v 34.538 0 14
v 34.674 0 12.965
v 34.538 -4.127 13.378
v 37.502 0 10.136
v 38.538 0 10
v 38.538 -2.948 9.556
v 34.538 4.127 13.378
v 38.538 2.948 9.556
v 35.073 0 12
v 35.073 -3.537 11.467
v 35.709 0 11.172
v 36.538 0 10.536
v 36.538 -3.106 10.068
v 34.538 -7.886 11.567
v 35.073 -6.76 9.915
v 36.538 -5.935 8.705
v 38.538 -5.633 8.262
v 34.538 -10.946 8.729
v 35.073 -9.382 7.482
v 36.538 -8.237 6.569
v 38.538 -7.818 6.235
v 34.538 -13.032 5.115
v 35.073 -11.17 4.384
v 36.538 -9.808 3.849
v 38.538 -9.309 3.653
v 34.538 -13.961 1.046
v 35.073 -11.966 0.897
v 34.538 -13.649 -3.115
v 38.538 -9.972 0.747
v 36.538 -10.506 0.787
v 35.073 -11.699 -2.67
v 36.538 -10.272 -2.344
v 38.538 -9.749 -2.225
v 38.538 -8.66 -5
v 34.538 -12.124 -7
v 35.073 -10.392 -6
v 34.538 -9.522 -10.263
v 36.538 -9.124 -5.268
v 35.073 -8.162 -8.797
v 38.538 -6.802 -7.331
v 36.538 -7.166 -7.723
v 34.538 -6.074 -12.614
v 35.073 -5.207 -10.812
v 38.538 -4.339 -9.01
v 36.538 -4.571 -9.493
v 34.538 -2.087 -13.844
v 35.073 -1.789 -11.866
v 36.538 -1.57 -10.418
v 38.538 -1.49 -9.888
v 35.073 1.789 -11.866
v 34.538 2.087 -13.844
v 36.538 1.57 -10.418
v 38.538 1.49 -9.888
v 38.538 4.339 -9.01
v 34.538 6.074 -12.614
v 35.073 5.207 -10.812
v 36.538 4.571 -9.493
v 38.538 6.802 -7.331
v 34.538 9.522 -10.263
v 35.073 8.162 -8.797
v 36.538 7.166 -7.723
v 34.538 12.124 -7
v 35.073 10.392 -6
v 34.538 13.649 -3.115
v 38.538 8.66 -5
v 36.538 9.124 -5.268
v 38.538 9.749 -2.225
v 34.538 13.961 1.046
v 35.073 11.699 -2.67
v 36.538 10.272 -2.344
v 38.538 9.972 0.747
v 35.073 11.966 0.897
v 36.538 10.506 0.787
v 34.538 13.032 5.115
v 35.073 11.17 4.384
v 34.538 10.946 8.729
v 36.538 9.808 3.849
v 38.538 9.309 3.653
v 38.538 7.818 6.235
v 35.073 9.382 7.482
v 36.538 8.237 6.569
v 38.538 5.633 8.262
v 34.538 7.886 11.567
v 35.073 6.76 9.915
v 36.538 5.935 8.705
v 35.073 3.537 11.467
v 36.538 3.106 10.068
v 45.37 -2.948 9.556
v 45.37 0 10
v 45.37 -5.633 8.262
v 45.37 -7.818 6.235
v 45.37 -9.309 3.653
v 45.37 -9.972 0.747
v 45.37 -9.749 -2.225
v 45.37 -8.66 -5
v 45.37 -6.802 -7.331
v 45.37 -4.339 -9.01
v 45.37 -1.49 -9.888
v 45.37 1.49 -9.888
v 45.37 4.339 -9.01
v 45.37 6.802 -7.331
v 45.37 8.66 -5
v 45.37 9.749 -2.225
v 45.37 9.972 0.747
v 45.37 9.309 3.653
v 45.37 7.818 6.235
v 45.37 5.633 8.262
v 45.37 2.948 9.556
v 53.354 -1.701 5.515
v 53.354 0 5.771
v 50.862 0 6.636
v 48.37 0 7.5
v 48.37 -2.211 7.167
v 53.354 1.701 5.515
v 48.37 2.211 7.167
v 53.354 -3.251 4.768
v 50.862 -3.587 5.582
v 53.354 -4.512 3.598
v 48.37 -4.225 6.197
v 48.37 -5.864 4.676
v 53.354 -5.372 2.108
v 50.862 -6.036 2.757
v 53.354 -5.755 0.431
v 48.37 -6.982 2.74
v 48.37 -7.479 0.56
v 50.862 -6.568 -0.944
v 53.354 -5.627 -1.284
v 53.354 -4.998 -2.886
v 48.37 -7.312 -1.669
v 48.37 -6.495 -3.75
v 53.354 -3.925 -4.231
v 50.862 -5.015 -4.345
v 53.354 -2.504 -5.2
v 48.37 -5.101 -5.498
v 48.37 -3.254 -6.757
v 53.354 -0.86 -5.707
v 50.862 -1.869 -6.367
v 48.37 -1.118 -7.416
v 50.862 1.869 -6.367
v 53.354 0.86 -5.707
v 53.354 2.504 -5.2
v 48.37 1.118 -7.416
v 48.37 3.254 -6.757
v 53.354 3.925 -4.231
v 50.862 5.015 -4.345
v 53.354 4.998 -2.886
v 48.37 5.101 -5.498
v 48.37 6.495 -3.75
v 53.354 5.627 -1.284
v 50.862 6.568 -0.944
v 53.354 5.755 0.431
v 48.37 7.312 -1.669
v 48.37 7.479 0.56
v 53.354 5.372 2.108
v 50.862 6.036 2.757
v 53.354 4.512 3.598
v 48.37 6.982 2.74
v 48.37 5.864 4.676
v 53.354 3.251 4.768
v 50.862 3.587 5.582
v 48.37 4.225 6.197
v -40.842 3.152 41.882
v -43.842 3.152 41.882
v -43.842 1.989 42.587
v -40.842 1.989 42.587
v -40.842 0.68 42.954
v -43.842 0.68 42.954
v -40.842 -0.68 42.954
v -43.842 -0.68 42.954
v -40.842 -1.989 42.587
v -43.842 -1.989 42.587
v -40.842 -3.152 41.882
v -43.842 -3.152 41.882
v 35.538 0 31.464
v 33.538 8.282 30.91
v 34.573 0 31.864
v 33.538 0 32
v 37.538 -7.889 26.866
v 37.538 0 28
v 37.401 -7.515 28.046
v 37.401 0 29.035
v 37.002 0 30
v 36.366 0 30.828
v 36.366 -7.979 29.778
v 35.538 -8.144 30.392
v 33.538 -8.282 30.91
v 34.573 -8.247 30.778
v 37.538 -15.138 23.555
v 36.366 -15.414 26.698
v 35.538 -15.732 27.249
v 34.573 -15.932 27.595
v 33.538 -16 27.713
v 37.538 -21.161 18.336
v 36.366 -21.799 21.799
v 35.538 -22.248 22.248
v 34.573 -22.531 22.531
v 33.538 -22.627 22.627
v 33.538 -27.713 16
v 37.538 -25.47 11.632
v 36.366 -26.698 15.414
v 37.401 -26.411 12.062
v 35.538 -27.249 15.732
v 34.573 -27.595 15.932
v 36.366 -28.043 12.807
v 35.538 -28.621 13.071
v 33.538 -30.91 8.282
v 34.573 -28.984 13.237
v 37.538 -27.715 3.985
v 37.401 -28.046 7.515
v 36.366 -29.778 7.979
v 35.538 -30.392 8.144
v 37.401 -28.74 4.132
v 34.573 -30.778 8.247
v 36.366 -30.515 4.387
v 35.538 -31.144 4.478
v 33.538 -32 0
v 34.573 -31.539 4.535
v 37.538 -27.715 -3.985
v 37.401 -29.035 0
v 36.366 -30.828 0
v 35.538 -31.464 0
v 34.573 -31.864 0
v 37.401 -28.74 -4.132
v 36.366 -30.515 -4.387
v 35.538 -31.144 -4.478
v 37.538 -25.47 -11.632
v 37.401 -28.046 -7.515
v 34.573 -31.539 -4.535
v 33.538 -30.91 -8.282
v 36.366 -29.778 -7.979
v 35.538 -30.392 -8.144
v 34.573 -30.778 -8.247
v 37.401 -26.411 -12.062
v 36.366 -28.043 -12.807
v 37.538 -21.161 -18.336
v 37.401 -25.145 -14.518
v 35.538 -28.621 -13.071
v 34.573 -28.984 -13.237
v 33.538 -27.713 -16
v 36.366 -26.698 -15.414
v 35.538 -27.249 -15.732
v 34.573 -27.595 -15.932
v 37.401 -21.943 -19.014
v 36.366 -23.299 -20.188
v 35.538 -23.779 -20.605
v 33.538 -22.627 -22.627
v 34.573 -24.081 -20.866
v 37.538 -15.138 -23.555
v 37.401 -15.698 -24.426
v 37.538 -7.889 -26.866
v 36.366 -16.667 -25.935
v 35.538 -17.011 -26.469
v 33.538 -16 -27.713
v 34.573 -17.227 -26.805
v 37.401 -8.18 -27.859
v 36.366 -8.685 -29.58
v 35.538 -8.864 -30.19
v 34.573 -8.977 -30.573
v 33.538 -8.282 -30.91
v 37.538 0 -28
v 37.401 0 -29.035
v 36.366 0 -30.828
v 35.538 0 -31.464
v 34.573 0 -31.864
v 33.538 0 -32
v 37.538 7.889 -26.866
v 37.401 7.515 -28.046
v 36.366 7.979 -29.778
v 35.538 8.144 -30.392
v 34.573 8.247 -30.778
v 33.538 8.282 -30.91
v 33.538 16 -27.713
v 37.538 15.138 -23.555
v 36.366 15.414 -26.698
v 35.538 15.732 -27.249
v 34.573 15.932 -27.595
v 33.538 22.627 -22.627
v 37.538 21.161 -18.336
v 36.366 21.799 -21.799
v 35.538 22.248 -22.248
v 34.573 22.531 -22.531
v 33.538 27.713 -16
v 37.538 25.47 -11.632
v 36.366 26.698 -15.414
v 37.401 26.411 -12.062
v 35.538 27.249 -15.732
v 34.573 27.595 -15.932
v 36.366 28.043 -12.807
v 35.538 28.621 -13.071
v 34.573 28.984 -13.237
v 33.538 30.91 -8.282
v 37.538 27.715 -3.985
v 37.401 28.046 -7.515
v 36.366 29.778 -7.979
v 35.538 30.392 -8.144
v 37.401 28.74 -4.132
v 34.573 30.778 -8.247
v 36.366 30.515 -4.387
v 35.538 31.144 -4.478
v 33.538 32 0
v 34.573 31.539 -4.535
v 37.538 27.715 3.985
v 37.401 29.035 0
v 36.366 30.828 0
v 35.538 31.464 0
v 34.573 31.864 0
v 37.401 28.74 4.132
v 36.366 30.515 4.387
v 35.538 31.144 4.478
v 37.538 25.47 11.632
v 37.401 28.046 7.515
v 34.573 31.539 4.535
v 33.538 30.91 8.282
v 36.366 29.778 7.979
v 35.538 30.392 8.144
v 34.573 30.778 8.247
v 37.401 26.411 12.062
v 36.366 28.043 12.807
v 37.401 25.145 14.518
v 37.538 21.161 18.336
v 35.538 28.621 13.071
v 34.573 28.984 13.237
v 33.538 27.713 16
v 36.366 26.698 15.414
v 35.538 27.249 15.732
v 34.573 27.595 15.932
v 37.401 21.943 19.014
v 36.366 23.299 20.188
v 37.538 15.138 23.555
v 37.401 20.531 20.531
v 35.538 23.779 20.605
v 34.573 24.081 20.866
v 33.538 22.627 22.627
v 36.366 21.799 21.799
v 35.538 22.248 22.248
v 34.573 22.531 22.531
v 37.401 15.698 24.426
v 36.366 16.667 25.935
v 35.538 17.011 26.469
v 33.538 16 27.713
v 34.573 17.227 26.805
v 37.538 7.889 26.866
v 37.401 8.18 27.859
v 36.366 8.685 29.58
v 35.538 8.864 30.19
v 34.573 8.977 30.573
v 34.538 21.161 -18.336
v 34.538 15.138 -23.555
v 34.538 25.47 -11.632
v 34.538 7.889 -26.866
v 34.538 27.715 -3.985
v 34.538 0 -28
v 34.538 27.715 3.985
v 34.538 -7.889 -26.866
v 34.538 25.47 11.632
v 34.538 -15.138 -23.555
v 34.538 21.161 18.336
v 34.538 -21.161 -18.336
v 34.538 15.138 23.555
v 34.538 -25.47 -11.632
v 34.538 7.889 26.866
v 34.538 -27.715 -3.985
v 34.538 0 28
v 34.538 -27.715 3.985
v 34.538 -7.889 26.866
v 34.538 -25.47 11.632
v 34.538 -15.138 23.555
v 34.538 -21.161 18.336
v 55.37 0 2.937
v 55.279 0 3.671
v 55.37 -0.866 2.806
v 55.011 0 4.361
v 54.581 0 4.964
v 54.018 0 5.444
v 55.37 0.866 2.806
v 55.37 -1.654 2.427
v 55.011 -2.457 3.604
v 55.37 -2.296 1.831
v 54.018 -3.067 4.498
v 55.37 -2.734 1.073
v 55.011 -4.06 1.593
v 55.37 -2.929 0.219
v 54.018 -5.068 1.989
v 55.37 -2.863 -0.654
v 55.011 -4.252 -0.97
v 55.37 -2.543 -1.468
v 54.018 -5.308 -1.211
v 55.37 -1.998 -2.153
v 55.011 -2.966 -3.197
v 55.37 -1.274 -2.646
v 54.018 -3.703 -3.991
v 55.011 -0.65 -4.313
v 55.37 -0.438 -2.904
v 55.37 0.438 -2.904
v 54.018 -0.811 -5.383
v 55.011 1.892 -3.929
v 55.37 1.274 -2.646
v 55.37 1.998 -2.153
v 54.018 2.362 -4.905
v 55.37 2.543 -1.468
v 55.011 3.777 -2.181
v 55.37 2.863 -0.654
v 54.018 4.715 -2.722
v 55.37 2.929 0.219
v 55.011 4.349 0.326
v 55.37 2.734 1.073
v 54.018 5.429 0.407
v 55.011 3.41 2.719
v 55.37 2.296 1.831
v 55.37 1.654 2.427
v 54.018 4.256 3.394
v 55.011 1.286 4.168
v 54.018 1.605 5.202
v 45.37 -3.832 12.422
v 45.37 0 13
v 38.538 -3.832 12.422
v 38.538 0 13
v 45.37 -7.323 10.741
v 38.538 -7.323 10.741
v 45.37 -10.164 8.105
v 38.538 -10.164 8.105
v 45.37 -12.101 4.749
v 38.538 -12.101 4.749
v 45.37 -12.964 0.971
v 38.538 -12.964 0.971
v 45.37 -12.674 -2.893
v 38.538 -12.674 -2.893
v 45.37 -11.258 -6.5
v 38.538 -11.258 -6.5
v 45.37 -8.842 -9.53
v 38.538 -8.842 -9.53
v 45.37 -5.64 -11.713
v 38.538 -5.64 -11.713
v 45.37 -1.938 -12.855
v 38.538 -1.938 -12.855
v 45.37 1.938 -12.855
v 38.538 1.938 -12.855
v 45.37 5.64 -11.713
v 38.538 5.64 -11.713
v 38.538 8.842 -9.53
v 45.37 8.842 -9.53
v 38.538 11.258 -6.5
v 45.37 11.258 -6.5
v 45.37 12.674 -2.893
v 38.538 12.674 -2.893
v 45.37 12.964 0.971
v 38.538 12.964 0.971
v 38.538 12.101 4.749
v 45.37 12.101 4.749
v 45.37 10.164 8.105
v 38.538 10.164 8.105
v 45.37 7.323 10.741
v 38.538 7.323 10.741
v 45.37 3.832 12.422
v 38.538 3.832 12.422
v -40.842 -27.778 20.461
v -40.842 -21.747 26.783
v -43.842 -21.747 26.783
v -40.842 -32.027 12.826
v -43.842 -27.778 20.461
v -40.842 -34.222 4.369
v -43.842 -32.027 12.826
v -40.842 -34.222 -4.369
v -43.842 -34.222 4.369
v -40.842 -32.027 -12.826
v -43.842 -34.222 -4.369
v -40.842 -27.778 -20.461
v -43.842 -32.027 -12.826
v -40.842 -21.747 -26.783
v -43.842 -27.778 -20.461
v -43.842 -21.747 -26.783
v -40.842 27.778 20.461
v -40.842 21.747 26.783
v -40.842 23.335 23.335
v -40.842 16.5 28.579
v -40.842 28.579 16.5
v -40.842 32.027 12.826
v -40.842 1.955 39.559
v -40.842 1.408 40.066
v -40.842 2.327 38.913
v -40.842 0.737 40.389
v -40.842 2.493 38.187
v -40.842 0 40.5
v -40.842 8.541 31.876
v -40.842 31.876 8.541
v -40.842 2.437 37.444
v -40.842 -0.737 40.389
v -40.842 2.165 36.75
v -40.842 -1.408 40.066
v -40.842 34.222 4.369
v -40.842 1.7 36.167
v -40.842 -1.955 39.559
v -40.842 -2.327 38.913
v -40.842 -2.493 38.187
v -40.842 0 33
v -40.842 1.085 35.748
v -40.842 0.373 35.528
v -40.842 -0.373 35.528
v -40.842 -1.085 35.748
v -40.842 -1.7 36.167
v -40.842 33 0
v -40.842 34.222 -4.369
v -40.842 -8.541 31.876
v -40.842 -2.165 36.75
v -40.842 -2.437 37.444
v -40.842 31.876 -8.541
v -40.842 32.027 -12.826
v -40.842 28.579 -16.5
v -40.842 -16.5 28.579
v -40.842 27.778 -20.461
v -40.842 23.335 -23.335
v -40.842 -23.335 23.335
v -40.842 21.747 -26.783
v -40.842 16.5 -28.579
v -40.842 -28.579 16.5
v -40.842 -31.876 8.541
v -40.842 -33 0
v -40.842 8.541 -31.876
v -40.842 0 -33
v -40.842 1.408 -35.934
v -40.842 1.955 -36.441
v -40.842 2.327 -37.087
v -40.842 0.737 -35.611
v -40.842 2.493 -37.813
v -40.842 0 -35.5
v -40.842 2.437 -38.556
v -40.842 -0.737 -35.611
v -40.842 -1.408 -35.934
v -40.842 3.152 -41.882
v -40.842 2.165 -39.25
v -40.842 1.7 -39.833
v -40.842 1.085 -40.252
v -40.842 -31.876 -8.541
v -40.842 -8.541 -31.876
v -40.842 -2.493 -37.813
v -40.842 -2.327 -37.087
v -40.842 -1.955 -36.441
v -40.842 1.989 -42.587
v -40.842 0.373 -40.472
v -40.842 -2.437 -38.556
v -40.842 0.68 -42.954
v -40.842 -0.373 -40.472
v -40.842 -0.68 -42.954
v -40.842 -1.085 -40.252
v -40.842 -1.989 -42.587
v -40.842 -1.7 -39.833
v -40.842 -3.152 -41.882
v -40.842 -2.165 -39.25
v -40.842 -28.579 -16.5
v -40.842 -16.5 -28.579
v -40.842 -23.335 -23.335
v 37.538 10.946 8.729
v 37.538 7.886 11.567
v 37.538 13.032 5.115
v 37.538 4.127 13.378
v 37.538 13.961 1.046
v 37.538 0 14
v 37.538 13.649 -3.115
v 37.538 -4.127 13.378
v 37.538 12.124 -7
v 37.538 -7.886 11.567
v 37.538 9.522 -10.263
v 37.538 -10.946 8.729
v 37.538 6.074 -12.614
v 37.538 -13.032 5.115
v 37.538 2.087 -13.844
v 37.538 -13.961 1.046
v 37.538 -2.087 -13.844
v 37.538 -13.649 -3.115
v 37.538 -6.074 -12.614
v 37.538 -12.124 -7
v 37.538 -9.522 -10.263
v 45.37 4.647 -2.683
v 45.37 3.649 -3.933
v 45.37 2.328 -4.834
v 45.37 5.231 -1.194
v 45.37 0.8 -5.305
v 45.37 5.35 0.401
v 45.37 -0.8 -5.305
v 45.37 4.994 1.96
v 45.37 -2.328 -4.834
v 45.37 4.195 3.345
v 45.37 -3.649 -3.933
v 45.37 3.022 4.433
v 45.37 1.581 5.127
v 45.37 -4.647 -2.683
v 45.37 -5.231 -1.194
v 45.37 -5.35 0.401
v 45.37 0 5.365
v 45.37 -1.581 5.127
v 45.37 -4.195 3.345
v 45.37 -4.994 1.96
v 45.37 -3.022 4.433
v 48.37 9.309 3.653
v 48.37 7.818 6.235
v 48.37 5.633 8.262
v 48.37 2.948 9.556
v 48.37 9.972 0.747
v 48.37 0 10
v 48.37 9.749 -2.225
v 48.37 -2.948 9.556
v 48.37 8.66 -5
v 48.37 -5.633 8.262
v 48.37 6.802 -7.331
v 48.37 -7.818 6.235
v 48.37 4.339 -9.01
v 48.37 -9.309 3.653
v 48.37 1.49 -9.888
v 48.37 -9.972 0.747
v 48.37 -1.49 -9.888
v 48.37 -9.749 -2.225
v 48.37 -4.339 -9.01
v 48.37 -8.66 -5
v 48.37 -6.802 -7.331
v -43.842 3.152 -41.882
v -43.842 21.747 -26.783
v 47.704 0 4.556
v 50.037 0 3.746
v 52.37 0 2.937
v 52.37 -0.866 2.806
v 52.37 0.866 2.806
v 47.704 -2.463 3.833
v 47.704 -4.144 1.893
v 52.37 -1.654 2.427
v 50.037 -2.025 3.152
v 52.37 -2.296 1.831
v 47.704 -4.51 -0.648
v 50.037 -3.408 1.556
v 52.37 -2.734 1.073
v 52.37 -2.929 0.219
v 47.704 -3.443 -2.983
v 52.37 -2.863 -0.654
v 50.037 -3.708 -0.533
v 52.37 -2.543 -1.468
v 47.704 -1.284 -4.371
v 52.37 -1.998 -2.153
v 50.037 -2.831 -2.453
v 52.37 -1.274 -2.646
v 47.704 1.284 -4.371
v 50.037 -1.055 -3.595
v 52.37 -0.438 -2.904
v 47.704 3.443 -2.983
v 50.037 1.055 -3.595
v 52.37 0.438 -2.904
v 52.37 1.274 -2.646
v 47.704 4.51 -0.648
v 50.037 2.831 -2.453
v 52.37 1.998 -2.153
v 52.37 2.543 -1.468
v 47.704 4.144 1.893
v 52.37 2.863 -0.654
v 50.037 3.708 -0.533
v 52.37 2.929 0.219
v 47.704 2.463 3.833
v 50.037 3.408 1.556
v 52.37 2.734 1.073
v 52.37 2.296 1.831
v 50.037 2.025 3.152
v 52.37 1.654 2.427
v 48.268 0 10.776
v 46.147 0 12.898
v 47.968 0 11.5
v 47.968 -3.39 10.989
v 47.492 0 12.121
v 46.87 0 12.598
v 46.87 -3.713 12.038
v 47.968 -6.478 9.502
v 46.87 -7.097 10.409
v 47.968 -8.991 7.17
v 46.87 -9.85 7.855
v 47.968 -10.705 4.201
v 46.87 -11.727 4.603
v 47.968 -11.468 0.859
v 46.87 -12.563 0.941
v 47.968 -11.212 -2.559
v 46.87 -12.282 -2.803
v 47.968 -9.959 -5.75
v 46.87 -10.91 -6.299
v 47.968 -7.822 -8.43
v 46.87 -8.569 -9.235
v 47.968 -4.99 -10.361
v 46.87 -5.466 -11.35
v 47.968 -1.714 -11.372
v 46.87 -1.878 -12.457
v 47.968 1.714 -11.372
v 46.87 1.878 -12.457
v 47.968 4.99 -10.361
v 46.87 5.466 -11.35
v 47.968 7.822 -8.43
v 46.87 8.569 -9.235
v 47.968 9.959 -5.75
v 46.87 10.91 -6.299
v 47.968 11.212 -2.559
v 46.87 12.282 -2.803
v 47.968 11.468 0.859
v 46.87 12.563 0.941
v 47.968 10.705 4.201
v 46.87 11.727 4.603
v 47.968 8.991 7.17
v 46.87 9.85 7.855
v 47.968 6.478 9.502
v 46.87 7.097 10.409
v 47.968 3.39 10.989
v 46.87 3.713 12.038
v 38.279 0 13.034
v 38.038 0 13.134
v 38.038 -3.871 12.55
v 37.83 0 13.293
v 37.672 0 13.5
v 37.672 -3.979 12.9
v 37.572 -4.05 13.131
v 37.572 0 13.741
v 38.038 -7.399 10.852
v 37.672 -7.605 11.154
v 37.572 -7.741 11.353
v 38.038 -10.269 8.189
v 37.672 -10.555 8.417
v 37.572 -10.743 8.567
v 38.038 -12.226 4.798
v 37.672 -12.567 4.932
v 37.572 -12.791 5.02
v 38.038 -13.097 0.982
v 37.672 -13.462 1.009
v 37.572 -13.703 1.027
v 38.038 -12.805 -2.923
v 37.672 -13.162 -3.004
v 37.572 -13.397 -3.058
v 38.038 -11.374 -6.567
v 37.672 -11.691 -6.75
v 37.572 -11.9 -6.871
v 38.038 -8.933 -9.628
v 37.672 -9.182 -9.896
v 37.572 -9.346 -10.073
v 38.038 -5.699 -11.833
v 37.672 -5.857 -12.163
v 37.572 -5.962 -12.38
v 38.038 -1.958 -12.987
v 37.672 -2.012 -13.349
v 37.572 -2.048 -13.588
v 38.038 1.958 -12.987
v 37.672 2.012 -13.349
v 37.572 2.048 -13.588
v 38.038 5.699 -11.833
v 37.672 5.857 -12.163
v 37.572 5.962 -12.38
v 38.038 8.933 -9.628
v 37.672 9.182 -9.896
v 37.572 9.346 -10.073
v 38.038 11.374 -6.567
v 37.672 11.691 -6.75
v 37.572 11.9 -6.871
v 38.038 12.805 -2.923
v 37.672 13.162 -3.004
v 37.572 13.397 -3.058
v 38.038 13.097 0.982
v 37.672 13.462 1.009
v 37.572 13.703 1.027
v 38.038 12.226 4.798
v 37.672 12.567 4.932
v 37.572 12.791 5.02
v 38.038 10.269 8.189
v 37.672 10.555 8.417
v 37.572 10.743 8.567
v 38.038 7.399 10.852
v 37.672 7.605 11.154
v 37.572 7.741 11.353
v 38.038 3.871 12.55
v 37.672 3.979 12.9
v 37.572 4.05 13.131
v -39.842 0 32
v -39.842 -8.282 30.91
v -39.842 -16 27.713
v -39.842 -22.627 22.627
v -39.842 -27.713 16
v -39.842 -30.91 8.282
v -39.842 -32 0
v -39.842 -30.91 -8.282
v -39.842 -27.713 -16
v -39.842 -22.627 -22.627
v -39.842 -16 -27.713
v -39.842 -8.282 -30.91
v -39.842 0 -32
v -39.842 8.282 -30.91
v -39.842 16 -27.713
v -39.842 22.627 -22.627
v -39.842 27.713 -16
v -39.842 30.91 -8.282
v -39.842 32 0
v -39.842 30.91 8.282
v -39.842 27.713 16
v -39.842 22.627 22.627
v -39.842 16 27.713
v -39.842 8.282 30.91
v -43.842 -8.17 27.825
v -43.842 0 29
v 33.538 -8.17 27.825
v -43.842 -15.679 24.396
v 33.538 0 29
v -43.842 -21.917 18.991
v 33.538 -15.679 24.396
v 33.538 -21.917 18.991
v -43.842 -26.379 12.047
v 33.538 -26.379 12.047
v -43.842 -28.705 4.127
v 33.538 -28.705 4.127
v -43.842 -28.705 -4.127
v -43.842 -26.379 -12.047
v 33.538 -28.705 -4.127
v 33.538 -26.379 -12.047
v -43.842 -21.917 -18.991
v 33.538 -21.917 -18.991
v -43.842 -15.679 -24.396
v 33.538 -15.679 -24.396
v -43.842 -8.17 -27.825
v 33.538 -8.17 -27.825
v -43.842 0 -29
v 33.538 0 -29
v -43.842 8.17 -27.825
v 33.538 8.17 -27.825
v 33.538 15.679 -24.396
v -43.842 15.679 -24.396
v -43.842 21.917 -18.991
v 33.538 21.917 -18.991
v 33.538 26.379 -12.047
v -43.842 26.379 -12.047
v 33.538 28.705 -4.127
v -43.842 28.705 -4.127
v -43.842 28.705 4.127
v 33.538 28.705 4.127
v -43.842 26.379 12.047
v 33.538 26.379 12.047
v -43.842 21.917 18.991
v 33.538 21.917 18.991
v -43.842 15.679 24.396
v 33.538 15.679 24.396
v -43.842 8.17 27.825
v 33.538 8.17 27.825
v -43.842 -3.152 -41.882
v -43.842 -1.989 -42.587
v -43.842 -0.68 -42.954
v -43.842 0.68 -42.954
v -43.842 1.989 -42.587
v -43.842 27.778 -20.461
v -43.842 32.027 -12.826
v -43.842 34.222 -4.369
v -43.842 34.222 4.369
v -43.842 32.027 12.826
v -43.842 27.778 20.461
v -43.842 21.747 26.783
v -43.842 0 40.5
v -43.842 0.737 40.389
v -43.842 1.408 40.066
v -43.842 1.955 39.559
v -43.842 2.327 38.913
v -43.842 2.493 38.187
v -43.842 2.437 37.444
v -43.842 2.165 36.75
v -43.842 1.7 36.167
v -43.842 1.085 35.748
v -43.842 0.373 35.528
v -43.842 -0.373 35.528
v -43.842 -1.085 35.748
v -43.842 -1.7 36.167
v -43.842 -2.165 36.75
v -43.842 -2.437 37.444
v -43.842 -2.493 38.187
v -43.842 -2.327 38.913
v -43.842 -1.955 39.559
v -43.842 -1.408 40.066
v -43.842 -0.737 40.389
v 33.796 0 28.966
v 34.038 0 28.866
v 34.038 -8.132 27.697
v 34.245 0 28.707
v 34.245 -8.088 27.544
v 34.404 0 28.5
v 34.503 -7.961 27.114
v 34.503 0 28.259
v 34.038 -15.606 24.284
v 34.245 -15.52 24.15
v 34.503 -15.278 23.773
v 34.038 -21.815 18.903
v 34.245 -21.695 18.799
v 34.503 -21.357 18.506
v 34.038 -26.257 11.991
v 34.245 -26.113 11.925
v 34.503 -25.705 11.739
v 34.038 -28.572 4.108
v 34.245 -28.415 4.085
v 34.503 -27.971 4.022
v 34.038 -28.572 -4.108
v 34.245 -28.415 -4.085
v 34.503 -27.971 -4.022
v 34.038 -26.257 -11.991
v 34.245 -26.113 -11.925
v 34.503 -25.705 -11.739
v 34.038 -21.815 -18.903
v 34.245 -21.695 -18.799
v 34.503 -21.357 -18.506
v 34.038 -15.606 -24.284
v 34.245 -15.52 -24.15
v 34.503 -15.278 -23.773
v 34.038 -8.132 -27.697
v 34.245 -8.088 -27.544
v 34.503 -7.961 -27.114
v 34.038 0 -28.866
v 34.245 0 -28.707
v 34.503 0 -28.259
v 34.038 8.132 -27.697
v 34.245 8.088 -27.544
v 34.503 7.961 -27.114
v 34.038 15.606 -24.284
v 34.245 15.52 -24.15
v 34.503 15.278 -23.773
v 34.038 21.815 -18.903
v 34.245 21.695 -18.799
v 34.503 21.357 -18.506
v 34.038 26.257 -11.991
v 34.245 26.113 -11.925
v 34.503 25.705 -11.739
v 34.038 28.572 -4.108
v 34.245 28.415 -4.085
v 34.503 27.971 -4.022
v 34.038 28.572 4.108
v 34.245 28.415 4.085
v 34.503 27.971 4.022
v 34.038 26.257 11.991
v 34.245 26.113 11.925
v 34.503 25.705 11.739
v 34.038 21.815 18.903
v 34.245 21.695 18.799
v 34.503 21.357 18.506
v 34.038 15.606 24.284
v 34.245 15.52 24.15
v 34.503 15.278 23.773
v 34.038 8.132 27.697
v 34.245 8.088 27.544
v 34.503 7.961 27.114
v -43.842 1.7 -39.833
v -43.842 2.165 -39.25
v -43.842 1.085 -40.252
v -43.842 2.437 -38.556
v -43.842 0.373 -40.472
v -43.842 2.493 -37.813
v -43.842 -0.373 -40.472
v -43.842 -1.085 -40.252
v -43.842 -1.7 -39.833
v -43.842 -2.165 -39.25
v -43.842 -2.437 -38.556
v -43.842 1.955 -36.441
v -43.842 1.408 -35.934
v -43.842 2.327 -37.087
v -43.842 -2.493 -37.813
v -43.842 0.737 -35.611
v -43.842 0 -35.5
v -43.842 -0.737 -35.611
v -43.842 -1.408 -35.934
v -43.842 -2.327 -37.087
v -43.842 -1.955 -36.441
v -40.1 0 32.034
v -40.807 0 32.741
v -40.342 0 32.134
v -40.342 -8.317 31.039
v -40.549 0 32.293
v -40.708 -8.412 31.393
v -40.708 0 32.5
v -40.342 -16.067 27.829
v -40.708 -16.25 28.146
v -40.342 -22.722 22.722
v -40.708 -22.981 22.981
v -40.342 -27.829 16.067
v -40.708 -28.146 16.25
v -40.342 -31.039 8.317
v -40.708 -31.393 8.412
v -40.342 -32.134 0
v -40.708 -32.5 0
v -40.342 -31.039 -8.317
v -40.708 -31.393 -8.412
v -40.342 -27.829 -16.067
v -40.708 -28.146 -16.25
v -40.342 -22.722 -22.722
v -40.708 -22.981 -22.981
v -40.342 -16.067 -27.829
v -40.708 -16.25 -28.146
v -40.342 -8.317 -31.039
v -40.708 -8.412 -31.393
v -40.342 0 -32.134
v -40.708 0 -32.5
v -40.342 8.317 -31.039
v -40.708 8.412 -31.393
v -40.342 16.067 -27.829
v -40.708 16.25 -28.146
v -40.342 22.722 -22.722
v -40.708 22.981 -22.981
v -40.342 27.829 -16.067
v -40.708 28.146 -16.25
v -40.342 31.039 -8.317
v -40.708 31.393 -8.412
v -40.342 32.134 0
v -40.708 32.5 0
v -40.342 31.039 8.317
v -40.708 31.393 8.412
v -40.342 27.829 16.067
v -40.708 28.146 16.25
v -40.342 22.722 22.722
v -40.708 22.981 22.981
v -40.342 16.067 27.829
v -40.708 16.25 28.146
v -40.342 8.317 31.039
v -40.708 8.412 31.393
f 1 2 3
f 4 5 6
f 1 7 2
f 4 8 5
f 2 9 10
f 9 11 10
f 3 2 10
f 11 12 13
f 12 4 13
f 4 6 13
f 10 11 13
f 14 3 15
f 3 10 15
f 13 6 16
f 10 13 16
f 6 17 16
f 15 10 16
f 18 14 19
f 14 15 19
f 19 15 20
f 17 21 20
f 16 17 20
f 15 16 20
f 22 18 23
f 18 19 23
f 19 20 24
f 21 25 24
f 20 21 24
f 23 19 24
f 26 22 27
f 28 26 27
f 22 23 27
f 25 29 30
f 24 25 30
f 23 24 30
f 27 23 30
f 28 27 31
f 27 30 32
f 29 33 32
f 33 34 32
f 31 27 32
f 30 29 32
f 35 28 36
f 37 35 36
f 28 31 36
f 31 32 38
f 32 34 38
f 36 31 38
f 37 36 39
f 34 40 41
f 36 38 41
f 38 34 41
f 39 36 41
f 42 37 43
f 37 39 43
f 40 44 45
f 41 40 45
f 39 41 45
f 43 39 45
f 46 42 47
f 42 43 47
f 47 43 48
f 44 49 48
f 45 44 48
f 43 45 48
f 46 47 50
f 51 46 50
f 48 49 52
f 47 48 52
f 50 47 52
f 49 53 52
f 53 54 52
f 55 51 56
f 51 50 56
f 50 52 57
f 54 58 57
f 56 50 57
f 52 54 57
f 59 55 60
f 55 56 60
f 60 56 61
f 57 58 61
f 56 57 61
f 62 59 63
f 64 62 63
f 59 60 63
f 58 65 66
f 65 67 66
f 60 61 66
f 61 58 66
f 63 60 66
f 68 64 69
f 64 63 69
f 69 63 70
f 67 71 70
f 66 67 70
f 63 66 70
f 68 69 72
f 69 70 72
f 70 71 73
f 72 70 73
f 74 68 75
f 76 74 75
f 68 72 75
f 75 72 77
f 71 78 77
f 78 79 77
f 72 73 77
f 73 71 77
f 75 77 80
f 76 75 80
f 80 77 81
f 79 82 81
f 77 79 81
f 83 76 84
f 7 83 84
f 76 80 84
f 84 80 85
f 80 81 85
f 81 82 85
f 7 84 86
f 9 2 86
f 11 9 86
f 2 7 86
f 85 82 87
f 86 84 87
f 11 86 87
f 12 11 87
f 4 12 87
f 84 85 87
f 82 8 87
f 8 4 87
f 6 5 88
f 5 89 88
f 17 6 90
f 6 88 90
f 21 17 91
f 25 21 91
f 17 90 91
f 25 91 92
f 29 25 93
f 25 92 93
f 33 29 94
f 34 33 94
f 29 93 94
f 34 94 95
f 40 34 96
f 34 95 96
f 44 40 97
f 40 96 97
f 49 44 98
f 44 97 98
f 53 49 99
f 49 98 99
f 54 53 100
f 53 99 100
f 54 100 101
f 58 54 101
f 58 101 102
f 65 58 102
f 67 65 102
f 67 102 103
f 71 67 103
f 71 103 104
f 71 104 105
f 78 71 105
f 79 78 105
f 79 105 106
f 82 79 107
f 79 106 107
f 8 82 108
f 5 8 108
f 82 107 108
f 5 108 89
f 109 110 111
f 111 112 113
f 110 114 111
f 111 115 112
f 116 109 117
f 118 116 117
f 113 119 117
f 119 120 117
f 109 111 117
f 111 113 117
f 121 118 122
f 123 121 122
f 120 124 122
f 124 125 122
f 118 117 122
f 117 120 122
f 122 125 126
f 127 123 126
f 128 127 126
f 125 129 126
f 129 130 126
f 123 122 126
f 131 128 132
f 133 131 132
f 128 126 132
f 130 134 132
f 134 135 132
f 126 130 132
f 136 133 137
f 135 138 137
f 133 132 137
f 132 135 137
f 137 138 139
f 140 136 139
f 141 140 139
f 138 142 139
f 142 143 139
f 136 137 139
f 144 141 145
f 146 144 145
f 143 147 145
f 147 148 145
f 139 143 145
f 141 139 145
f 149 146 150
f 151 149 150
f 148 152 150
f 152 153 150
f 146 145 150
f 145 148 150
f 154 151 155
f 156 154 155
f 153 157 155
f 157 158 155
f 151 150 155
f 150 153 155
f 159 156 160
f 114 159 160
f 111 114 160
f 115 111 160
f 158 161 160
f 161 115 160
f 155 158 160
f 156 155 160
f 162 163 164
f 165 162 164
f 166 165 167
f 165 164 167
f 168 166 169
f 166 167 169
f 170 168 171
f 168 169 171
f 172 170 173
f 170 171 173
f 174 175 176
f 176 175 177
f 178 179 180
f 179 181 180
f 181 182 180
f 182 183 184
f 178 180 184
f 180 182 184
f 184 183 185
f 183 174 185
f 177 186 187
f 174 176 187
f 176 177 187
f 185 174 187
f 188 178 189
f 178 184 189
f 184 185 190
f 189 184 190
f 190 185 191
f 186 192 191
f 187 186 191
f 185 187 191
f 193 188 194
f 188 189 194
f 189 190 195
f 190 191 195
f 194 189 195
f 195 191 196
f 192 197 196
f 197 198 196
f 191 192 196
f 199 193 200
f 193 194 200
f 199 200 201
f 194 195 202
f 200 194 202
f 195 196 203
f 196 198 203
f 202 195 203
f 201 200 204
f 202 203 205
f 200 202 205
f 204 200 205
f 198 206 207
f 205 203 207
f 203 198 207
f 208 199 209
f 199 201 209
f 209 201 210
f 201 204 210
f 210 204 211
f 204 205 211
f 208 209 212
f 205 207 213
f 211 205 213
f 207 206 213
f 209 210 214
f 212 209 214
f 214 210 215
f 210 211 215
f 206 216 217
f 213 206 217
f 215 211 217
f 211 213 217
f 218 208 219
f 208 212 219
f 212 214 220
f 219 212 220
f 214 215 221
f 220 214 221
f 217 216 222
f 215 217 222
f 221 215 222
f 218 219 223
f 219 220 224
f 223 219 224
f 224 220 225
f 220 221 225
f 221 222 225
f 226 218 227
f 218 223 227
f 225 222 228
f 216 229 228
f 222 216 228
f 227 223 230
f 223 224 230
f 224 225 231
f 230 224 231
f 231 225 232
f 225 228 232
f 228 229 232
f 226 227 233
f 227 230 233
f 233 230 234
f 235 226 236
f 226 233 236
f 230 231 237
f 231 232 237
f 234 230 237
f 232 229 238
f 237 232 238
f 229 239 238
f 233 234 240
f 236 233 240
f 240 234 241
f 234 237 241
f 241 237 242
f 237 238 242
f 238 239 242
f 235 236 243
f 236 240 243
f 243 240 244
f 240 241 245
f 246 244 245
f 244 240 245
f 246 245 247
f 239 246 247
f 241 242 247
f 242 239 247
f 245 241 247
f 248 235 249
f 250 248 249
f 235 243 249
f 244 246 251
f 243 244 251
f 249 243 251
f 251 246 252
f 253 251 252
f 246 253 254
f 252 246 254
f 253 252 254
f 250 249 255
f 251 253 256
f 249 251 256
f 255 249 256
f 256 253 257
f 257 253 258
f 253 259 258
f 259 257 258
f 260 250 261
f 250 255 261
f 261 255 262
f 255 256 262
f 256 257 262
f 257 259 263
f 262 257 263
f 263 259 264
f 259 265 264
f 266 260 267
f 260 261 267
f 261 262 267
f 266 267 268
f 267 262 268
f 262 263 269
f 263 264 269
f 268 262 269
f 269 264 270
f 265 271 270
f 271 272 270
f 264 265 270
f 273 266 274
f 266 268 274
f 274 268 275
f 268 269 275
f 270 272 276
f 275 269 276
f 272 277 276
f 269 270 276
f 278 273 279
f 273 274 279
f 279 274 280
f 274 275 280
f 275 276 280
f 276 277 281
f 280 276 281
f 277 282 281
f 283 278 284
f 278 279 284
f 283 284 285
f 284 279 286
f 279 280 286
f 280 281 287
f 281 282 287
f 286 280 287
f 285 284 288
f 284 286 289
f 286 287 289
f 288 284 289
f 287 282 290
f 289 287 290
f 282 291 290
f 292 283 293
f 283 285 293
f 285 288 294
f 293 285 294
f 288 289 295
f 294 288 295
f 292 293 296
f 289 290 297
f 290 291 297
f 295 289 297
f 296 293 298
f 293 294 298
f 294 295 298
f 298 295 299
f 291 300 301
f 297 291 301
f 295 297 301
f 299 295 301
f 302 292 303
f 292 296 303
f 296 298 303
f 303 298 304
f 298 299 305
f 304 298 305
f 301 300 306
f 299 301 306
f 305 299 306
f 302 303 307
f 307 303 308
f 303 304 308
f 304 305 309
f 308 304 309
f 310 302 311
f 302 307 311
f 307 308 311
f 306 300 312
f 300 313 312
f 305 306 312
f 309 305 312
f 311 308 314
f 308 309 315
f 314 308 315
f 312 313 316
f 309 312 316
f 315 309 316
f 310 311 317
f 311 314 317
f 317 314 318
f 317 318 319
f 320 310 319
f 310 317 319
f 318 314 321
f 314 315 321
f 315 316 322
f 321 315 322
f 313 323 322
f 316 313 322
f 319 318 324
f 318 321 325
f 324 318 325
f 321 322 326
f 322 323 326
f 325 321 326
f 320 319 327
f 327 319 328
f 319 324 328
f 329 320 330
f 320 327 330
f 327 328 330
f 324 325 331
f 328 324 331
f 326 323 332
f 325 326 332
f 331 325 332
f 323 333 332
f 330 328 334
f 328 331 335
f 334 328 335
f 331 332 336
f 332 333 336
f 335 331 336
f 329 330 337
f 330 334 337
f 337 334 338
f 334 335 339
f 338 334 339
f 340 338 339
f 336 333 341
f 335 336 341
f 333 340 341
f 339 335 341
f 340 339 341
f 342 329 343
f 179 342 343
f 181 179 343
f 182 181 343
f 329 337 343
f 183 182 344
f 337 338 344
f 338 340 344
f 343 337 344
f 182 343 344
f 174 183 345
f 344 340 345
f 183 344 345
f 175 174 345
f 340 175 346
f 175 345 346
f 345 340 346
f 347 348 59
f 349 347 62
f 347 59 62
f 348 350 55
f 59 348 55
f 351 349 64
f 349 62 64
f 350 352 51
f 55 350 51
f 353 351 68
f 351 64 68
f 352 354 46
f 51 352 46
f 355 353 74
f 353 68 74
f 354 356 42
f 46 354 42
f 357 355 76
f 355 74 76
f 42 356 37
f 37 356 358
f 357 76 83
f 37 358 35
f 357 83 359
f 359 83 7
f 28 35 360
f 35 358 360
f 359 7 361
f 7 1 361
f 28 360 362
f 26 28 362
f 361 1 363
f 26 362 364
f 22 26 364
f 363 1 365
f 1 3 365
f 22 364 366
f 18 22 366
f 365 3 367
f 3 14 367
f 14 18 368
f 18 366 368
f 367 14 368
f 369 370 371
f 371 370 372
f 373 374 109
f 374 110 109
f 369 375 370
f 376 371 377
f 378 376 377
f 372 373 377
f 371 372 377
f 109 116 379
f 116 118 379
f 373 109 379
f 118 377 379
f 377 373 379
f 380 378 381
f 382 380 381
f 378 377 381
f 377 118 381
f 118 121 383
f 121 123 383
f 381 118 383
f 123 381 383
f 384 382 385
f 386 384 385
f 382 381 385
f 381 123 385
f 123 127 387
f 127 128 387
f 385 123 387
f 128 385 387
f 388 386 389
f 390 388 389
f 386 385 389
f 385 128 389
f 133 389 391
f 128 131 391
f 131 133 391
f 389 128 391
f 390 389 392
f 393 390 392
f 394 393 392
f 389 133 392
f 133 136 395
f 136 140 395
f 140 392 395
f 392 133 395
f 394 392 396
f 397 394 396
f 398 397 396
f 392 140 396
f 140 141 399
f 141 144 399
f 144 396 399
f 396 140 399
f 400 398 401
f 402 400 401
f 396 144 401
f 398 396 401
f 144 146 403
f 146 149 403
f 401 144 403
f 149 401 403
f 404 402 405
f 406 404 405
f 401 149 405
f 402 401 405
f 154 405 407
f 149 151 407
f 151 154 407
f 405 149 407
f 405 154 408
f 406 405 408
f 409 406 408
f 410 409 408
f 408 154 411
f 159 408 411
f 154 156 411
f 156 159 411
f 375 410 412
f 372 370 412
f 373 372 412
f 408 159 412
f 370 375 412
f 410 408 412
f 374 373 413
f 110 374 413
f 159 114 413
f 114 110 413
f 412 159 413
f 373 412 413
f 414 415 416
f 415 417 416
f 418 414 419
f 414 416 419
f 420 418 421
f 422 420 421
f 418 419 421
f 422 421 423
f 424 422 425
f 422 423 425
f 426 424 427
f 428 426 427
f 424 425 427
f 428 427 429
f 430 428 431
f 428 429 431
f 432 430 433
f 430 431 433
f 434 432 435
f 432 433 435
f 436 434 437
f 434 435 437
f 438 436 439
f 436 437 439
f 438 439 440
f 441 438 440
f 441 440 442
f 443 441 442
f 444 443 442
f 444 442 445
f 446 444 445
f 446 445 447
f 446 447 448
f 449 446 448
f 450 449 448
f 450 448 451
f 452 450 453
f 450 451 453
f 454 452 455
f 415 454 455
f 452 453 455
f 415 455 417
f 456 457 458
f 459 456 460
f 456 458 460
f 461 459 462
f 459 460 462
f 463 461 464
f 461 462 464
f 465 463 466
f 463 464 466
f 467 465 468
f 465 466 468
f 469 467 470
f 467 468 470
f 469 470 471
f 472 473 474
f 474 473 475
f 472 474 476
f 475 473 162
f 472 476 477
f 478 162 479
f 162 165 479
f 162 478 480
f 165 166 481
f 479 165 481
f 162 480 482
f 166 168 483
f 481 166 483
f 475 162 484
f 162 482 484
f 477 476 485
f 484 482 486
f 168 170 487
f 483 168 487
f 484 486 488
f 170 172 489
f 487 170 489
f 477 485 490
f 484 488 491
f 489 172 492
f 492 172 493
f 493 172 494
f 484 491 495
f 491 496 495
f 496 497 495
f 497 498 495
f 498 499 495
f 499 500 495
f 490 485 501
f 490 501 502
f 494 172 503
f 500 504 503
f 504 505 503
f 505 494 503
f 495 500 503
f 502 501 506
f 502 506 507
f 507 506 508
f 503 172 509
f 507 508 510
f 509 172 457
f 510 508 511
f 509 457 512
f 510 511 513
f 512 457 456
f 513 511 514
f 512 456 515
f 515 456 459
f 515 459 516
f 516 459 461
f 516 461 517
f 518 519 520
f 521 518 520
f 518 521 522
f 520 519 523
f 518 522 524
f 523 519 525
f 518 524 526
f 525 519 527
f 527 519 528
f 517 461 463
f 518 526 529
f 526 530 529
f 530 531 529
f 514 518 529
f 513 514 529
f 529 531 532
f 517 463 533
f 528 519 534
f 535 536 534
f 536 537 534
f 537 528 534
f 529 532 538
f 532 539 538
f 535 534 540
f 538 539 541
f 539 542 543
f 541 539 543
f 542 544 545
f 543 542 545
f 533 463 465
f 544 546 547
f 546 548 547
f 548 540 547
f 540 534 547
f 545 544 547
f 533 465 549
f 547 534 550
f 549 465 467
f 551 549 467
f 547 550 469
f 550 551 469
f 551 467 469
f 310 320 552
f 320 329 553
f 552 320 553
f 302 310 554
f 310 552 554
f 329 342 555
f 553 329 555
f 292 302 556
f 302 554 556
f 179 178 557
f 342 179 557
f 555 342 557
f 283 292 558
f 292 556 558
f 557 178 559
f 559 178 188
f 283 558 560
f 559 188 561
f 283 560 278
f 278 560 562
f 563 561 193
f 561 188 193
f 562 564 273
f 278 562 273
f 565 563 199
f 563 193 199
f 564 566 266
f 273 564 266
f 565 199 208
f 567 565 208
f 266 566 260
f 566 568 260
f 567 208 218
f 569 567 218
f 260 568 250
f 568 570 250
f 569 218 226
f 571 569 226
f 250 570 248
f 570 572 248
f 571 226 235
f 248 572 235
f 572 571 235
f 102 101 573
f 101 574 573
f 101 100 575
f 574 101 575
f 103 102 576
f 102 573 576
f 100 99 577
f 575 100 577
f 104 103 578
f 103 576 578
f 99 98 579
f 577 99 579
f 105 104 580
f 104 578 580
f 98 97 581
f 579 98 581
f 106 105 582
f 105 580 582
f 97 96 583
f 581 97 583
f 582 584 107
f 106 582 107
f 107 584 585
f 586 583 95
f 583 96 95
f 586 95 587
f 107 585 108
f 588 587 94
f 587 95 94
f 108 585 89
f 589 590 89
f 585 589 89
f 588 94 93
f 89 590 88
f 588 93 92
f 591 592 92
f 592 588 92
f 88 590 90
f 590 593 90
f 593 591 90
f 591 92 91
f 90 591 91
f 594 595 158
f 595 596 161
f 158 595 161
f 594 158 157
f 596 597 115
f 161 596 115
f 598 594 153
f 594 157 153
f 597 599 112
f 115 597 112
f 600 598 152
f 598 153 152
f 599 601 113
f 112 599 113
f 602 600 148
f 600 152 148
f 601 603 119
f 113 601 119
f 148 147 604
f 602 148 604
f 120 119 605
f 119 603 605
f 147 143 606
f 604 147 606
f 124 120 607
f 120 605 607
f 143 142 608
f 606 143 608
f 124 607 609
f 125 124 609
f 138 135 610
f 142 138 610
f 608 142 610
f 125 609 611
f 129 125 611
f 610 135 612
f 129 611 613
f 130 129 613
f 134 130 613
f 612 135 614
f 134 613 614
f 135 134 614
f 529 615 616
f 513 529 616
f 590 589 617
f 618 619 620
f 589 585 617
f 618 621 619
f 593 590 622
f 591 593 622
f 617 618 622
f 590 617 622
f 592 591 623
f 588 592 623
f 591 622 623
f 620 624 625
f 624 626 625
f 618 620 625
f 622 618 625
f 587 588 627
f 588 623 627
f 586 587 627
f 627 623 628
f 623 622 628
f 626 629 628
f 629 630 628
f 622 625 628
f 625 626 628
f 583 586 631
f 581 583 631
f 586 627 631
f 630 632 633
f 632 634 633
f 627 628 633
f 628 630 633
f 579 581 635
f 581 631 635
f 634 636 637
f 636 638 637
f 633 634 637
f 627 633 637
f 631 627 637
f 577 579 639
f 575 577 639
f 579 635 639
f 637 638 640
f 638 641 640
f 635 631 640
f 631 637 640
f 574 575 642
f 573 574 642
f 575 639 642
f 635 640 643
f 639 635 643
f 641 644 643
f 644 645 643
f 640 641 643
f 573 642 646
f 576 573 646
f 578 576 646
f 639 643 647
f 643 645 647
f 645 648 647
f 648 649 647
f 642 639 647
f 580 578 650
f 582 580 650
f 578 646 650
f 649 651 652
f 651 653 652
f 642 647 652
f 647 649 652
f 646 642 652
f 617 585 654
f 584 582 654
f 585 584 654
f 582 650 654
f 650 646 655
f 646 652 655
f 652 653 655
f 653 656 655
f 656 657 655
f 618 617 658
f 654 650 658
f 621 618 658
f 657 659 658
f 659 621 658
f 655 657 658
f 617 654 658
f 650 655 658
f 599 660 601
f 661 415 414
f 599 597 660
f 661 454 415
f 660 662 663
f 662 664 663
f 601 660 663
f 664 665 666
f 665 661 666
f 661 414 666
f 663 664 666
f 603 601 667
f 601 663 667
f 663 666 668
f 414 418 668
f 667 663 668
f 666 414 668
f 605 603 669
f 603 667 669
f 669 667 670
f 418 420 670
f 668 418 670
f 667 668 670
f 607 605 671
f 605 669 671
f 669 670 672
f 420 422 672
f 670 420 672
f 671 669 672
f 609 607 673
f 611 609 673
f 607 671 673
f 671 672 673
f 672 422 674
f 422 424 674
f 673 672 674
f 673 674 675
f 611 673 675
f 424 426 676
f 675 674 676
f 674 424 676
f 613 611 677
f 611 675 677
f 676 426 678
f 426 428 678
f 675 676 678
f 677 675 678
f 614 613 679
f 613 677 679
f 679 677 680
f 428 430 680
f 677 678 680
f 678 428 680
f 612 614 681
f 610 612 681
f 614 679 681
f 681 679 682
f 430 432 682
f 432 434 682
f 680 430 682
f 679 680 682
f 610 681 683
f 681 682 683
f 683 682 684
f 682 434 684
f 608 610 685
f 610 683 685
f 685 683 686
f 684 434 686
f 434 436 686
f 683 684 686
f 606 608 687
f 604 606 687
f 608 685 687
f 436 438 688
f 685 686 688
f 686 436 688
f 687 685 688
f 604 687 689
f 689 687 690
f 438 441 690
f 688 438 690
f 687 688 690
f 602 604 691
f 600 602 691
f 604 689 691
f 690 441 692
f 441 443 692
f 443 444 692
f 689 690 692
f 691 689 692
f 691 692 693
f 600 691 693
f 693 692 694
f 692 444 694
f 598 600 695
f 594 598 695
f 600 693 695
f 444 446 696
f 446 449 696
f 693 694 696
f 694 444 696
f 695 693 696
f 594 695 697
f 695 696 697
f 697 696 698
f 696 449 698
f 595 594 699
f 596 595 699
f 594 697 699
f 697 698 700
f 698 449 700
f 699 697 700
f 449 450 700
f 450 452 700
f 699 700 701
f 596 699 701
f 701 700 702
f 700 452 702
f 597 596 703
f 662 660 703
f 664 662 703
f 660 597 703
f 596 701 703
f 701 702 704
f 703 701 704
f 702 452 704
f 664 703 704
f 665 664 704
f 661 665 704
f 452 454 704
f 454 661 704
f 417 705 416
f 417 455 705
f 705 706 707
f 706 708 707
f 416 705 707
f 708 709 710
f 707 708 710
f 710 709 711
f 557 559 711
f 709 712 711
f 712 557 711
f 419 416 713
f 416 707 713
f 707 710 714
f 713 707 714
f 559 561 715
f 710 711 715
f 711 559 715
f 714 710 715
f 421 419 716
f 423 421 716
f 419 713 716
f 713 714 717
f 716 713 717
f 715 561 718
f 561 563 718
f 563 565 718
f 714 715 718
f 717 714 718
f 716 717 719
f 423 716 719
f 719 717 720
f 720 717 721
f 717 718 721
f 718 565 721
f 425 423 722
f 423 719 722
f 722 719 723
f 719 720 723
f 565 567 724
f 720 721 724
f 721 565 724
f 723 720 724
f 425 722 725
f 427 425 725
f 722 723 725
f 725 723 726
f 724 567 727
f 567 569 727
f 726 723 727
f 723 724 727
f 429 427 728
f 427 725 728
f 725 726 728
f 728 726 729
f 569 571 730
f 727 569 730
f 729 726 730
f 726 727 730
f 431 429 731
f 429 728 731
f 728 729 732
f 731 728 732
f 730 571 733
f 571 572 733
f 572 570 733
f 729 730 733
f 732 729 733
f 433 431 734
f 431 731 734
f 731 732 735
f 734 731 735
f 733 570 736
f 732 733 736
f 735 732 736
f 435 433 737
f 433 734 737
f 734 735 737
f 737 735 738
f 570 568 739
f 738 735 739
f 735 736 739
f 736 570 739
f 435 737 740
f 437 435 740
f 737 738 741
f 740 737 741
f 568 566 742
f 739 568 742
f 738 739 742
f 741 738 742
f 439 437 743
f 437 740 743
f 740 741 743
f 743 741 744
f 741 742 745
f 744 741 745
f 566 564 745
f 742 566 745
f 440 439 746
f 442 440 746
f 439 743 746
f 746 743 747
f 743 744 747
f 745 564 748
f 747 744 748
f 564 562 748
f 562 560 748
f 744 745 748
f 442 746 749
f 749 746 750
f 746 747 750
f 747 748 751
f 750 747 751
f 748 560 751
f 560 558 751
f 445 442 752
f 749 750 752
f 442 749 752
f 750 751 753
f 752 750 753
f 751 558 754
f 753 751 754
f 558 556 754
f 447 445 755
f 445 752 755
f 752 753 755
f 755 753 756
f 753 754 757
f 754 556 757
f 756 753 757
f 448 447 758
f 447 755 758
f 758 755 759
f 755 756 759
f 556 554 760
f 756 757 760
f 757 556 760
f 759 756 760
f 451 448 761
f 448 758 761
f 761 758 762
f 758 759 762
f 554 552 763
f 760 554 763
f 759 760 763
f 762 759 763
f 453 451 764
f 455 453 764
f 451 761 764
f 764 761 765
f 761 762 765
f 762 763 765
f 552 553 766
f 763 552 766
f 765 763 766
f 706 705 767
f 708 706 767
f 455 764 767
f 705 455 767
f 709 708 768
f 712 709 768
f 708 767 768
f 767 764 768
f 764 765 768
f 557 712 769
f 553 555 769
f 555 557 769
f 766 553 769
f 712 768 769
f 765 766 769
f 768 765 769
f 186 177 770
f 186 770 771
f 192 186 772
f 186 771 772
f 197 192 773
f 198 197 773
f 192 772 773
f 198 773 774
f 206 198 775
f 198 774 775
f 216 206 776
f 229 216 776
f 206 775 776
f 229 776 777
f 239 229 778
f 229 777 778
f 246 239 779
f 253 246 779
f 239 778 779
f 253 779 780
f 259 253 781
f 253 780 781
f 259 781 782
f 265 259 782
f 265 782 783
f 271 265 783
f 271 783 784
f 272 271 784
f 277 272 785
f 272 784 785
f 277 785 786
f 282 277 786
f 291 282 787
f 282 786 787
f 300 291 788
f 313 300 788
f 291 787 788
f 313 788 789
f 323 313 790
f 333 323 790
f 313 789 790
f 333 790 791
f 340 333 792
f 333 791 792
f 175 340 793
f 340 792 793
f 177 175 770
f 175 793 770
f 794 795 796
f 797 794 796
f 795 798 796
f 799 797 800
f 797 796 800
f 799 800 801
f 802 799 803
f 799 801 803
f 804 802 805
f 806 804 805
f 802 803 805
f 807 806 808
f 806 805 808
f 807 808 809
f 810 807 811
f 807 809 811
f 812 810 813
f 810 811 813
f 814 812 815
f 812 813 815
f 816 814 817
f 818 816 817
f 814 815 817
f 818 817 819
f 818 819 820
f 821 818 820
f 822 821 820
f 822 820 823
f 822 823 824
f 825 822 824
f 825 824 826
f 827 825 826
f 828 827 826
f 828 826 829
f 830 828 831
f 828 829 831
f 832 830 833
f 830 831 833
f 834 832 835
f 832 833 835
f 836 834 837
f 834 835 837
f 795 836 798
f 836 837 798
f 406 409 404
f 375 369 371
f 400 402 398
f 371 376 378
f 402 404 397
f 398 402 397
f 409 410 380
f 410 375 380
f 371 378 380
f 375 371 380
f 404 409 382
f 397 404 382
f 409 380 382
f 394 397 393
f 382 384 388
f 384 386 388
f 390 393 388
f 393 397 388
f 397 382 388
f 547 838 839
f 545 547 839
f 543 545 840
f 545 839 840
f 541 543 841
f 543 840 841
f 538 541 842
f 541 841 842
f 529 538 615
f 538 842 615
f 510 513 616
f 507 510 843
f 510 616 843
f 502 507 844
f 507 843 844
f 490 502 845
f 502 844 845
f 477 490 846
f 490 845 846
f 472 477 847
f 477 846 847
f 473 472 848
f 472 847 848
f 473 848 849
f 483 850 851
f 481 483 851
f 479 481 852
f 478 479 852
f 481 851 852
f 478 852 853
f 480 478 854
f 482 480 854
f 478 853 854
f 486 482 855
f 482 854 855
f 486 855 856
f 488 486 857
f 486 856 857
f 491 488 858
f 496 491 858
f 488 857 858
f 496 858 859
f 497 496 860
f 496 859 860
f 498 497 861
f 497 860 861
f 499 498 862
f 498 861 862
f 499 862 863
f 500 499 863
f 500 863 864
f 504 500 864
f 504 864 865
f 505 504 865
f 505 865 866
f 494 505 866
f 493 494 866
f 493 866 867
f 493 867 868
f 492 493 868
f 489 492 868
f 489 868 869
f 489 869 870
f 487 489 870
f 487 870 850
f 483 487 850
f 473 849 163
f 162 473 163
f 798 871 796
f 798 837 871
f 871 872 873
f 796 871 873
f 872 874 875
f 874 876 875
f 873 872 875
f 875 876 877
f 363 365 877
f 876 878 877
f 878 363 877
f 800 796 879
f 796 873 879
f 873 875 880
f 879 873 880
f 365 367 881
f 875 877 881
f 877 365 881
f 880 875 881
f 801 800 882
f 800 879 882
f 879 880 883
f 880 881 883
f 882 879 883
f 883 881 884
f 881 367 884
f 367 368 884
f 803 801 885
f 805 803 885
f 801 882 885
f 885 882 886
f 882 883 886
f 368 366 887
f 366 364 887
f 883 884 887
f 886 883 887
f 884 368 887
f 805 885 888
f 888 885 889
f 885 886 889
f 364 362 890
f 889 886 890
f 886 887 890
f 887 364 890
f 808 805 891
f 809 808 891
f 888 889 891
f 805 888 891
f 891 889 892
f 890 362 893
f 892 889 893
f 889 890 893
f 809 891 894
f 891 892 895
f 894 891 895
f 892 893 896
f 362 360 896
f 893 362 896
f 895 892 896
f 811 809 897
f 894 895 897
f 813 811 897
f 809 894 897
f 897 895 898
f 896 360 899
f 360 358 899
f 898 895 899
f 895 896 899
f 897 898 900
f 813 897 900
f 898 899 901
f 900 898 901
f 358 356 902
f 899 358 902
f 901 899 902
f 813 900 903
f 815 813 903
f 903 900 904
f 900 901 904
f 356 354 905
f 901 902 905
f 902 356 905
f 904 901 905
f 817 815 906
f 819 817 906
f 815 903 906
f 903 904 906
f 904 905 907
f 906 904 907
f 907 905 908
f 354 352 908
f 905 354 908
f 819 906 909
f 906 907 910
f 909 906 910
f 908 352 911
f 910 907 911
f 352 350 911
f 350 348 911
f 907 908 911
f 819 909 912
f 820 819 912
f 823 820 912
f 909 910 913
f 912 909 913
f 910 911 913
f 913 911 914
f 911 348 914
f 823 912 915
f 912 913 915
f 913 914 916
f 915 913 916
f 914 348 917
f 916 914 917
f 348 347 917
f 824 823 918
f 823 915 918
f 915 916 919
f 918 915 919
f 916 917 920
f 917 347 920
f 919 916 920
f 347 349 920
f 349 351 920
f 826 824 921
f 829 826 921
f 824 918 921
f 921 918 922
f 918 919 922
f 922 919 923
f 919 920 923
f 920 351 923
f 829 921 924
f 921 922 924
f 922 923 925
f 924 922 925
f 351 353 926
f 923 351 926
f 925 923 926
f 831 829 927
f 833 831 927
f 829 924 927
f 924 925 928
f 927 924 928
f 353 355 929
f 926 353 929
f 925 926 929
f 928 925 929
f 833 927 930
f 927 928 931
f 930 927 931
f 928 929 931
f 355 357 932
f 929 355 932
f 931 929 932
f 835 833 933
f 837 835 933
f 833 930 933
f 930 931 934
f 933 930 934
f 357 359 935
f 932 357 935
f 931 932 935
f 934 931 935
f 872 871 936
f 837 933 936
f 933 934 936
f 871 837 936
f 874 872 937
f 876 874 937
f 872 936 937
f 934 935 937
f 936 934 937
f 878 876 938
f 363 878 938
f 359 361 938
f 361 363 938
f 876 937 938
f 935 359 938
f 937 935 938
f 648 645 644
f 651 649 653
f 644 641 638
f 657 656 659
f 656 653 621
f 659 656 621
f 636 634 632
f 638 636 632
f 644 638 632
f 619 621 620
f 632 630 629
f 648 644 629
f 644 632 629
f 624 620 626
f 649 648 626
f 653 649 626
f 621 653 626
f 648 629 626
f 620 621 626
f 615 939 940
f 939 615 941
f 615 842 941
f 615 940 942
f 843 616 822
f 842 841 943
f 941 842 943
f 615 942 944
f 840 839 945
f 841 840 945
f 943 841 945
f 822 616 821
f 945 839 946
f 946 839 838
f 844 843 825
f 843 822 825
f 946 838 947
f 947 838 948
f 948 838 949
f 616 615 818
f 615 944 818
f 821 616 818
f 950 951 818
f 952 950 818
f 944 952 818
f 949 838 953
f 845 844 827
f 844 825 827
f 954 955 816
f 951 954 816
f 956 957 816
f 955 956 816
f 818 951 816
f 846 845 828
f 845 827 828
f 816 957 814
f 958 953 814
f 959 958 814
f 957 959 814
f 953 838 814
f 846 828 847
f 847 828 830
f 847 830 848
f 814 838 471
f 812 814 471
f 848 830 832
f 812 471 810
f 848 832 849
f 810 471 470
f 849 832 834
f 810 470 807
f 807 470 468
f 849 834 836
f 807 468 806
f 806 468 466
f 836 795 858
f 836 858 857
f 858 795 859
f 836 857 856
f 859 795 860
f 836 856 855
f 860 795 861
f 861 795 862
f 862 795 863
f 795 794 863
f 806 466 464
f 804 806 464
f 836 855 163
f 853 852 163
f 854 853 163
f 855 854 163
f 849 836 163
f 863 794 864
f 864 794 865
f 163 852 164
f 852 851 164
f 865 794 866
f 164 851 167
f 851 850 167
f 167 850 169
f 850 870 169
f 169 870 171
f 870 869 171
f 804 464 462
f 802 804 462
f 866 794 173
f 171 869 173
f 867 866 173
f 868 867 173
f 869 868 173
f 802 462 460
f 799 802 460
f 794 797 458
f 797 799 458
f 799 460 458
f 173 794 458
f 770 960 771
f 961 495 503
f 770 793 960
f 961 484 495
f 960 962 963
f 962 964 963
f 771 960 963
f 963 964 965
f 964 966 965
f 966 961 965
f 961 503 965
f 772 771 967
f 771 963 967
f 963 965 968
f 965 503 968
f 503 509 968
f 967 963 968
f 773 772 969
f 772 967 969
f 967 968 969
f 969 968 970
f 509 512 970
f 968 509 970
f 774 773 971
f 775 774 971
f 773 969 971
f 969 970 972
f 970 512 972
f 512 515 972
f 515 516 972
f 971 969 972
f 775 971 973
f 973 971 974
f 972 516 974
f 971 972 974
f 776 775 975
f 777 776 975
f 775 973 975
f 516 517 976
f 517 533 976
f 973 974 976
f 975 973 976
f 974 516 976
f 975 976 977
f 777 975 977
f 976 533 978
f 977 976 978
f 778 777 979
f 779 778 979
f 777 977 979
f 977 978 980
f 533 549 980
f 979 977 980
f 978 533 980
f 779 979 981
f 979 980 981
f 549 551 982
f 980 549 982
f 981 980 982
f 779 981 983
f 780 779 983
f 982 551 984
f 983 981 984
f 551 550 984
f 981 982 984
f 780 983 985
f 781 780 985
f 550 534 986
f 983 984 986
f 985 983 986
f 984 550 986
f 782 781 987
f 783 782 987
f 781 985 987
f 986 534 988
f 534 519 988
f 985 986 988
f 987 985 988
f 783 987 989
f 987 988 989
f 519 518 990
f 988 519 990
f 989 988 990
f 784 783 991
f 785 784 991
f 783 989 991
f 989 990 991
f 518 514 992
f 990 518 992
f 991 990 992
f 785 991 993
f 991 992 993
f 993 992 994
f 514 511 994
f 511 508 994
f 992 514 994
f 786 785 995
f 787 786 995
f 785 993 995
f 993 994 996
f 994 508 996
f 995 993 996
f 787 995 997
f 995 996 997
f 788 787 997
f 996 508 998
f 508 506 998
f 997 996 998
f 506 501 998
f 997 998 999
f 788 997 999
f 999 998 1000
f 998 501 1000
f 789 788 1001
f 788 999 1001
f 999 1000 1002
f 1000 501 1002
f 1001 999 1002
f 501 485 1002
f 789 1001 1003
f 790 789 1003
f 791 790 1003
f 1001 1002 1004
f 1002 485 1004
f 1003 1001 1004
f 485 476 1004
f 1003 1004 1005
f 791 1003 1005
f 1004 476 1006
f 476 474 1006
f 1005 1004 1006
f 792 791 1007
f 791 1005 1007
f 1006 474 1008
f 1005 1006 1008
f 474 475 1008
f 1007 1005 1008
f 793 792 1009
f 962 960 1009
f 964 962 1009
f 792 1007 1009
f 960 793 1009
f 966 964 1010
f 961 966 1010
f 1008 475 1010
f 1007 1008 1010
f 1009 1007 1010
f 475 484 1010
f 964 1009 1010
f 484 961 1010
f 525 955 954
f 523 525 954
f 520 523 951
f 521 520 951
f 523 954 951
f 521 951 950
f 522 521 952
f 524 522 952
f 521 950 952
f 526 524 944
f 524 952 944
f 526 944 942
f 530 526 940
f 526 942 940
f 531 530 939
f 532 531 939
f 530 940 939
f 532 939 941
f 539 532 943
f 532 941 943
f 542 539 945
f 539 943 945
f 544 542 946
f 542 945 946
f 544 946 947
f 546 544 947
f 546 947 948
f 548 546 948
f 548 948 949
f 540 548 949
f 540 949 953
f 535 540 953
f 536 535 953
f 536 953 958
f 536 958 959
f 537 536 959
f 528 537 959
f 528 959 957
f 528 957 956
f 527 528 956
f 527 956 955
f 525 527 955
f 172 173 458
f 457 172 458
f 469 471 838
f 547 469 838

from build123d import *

# Parameters (mm, degrees)
ESQUISSE2_R             = 49.06578461
ENL_V_MAT_EXTRU_1_DEPTH = 118.868532804
ESQUISSE3_R             = 2.5
ENL_V_MAT_EXTRU_2_DEPTH = 114.499960464


with BuildPart() as part:
    # Esquisse1 → Révolution1 (revolve)
    with BuildSketch(Plane.XY, mode=Mode.PRIVATE) as r_volution1_sk:
        with BuildLine():
            Line((-43.841564166, 45), (-43.841564166, 29))
            Line((-43.841564166, 29), (33.537566626, 29))
            ThreePointArc((33.537566626, 29), (34.244673407, 28.707106781), (34.537566626, 28))
            Line((34.537566626, 28), (34.537566626, 14))
            ThreePointArc((34.537566626, 14), (35.709139501, 11.171572875), (38.537566626, 10))
            Line((38.537566626, 10), (45.370284953, 10))
            Line((45.370284953, 10), (45.370284953, 5.365359199))
            Line((45.370284953, 5.365359199), (52.370284953, 2.936913115))
            Line((52.370284953, 2.936913115), (52.370284953, 0))
            Line((52.370284953, 0), (55.370284953, 0))
            Line((55.370284953, 0), (55.370284953, 2.936913115))
            ThreePointArc((55.370284953, 2.936913115), (54.814647694, 4.676191928), (53.35355776, 5.771198666))
            Line((53.35355776, 5.771198666), (48.370284953, 7.5))
            Line((48.370284953, 7.5), (48.370284953, 10))
            ThreePointArc((48.370284953, 10), (47.491605296, 12.121320344), (45.370284953, 13))
            Line((45.370284953, 13), (38.537566626, 13))
            ThreePointArc((38.537566626, 13), (37.830459844, 13.292893219), (37.537566626, 14))
            Line((37.537566626, 14), (37.537566626, 28))
            ThreePointArc((37.537566626, 28), (36.36599375, 30.828427125), (33.537566626, 32))
            Line((33.537566626, 32), (-39.841564166, 32))
            ThreePointArc((-39.841564166, 32), (-40.548670947, 32.292893219), (-40.841564166, 33))
            Line((-40.841564166, 33), (-40.841564166, 45))
            Line((-40.841564166, 45), (-43.841564166, 45))
        make_face()
    revolve(r_volution1_sk.sketch.rotate(Axis((-73.163253383, 0, 0), (1, 0, 0)), 90), axis=Axis((-73.163253383, 0, 0), (1, 0, 0)))

    # Esquisse2 → Enlèv. mat.-Extru.1 (cut, through all)
    with BuildSketch(Plane.ZY.offset(43.841564166)):
        Circle(ESQUISSE2_R)
        with BuildLine():
            Line((-41.881578947, 3.151720939), (-26.782894737, 21.746874477))
            ThreePointArc((-26.782894737, 21.746874477), (0, 34.5), (26.782894737, 21.746874477))
            Line((26.782894737, 21.746874477), (41.881578947, 3.151720939))
            ThreePointArc((41.881578947, 3.151720939), (43, 0), (41.881578947, -3.151720939))
            Line((41.881578947, -3.151720939), (26.782894737, -21.746874477))
            ThreePointArc((26.782894737, -21.746874477), (0, -34.5), (-26.782894737, -21.746874477))
            Line((-26.782894737, -21.746874477), (-41.881578947, -3.151720939))
            ThreePointArc((-41.881578947, -3.151720939), (-43, 0), (-41.881578947, 3.151720939))
        make_face(mode=Mode.SUBTRACT)
    extrude(amount=-ENL_V_MAT_EXTRU_1_DEPTH, mode=Mode.SUBTRACT)

    # Esquisse3 → Enlèv. mat.-Extru.2 (cut, through all)
    with BuildSketch(Plane.ZY.offset(43.841564166)):
        with Locations((38, 0)):
            Circle(ESQUISSE3_R)
        with Locations((-38, 0)):
            Circle(ESQUISSE3_R)
    extrude(amount=-ENL_V_MAT_EXTRU_2_DEPTH, mode=Mode.SUBTRACT)


solid = part.part
